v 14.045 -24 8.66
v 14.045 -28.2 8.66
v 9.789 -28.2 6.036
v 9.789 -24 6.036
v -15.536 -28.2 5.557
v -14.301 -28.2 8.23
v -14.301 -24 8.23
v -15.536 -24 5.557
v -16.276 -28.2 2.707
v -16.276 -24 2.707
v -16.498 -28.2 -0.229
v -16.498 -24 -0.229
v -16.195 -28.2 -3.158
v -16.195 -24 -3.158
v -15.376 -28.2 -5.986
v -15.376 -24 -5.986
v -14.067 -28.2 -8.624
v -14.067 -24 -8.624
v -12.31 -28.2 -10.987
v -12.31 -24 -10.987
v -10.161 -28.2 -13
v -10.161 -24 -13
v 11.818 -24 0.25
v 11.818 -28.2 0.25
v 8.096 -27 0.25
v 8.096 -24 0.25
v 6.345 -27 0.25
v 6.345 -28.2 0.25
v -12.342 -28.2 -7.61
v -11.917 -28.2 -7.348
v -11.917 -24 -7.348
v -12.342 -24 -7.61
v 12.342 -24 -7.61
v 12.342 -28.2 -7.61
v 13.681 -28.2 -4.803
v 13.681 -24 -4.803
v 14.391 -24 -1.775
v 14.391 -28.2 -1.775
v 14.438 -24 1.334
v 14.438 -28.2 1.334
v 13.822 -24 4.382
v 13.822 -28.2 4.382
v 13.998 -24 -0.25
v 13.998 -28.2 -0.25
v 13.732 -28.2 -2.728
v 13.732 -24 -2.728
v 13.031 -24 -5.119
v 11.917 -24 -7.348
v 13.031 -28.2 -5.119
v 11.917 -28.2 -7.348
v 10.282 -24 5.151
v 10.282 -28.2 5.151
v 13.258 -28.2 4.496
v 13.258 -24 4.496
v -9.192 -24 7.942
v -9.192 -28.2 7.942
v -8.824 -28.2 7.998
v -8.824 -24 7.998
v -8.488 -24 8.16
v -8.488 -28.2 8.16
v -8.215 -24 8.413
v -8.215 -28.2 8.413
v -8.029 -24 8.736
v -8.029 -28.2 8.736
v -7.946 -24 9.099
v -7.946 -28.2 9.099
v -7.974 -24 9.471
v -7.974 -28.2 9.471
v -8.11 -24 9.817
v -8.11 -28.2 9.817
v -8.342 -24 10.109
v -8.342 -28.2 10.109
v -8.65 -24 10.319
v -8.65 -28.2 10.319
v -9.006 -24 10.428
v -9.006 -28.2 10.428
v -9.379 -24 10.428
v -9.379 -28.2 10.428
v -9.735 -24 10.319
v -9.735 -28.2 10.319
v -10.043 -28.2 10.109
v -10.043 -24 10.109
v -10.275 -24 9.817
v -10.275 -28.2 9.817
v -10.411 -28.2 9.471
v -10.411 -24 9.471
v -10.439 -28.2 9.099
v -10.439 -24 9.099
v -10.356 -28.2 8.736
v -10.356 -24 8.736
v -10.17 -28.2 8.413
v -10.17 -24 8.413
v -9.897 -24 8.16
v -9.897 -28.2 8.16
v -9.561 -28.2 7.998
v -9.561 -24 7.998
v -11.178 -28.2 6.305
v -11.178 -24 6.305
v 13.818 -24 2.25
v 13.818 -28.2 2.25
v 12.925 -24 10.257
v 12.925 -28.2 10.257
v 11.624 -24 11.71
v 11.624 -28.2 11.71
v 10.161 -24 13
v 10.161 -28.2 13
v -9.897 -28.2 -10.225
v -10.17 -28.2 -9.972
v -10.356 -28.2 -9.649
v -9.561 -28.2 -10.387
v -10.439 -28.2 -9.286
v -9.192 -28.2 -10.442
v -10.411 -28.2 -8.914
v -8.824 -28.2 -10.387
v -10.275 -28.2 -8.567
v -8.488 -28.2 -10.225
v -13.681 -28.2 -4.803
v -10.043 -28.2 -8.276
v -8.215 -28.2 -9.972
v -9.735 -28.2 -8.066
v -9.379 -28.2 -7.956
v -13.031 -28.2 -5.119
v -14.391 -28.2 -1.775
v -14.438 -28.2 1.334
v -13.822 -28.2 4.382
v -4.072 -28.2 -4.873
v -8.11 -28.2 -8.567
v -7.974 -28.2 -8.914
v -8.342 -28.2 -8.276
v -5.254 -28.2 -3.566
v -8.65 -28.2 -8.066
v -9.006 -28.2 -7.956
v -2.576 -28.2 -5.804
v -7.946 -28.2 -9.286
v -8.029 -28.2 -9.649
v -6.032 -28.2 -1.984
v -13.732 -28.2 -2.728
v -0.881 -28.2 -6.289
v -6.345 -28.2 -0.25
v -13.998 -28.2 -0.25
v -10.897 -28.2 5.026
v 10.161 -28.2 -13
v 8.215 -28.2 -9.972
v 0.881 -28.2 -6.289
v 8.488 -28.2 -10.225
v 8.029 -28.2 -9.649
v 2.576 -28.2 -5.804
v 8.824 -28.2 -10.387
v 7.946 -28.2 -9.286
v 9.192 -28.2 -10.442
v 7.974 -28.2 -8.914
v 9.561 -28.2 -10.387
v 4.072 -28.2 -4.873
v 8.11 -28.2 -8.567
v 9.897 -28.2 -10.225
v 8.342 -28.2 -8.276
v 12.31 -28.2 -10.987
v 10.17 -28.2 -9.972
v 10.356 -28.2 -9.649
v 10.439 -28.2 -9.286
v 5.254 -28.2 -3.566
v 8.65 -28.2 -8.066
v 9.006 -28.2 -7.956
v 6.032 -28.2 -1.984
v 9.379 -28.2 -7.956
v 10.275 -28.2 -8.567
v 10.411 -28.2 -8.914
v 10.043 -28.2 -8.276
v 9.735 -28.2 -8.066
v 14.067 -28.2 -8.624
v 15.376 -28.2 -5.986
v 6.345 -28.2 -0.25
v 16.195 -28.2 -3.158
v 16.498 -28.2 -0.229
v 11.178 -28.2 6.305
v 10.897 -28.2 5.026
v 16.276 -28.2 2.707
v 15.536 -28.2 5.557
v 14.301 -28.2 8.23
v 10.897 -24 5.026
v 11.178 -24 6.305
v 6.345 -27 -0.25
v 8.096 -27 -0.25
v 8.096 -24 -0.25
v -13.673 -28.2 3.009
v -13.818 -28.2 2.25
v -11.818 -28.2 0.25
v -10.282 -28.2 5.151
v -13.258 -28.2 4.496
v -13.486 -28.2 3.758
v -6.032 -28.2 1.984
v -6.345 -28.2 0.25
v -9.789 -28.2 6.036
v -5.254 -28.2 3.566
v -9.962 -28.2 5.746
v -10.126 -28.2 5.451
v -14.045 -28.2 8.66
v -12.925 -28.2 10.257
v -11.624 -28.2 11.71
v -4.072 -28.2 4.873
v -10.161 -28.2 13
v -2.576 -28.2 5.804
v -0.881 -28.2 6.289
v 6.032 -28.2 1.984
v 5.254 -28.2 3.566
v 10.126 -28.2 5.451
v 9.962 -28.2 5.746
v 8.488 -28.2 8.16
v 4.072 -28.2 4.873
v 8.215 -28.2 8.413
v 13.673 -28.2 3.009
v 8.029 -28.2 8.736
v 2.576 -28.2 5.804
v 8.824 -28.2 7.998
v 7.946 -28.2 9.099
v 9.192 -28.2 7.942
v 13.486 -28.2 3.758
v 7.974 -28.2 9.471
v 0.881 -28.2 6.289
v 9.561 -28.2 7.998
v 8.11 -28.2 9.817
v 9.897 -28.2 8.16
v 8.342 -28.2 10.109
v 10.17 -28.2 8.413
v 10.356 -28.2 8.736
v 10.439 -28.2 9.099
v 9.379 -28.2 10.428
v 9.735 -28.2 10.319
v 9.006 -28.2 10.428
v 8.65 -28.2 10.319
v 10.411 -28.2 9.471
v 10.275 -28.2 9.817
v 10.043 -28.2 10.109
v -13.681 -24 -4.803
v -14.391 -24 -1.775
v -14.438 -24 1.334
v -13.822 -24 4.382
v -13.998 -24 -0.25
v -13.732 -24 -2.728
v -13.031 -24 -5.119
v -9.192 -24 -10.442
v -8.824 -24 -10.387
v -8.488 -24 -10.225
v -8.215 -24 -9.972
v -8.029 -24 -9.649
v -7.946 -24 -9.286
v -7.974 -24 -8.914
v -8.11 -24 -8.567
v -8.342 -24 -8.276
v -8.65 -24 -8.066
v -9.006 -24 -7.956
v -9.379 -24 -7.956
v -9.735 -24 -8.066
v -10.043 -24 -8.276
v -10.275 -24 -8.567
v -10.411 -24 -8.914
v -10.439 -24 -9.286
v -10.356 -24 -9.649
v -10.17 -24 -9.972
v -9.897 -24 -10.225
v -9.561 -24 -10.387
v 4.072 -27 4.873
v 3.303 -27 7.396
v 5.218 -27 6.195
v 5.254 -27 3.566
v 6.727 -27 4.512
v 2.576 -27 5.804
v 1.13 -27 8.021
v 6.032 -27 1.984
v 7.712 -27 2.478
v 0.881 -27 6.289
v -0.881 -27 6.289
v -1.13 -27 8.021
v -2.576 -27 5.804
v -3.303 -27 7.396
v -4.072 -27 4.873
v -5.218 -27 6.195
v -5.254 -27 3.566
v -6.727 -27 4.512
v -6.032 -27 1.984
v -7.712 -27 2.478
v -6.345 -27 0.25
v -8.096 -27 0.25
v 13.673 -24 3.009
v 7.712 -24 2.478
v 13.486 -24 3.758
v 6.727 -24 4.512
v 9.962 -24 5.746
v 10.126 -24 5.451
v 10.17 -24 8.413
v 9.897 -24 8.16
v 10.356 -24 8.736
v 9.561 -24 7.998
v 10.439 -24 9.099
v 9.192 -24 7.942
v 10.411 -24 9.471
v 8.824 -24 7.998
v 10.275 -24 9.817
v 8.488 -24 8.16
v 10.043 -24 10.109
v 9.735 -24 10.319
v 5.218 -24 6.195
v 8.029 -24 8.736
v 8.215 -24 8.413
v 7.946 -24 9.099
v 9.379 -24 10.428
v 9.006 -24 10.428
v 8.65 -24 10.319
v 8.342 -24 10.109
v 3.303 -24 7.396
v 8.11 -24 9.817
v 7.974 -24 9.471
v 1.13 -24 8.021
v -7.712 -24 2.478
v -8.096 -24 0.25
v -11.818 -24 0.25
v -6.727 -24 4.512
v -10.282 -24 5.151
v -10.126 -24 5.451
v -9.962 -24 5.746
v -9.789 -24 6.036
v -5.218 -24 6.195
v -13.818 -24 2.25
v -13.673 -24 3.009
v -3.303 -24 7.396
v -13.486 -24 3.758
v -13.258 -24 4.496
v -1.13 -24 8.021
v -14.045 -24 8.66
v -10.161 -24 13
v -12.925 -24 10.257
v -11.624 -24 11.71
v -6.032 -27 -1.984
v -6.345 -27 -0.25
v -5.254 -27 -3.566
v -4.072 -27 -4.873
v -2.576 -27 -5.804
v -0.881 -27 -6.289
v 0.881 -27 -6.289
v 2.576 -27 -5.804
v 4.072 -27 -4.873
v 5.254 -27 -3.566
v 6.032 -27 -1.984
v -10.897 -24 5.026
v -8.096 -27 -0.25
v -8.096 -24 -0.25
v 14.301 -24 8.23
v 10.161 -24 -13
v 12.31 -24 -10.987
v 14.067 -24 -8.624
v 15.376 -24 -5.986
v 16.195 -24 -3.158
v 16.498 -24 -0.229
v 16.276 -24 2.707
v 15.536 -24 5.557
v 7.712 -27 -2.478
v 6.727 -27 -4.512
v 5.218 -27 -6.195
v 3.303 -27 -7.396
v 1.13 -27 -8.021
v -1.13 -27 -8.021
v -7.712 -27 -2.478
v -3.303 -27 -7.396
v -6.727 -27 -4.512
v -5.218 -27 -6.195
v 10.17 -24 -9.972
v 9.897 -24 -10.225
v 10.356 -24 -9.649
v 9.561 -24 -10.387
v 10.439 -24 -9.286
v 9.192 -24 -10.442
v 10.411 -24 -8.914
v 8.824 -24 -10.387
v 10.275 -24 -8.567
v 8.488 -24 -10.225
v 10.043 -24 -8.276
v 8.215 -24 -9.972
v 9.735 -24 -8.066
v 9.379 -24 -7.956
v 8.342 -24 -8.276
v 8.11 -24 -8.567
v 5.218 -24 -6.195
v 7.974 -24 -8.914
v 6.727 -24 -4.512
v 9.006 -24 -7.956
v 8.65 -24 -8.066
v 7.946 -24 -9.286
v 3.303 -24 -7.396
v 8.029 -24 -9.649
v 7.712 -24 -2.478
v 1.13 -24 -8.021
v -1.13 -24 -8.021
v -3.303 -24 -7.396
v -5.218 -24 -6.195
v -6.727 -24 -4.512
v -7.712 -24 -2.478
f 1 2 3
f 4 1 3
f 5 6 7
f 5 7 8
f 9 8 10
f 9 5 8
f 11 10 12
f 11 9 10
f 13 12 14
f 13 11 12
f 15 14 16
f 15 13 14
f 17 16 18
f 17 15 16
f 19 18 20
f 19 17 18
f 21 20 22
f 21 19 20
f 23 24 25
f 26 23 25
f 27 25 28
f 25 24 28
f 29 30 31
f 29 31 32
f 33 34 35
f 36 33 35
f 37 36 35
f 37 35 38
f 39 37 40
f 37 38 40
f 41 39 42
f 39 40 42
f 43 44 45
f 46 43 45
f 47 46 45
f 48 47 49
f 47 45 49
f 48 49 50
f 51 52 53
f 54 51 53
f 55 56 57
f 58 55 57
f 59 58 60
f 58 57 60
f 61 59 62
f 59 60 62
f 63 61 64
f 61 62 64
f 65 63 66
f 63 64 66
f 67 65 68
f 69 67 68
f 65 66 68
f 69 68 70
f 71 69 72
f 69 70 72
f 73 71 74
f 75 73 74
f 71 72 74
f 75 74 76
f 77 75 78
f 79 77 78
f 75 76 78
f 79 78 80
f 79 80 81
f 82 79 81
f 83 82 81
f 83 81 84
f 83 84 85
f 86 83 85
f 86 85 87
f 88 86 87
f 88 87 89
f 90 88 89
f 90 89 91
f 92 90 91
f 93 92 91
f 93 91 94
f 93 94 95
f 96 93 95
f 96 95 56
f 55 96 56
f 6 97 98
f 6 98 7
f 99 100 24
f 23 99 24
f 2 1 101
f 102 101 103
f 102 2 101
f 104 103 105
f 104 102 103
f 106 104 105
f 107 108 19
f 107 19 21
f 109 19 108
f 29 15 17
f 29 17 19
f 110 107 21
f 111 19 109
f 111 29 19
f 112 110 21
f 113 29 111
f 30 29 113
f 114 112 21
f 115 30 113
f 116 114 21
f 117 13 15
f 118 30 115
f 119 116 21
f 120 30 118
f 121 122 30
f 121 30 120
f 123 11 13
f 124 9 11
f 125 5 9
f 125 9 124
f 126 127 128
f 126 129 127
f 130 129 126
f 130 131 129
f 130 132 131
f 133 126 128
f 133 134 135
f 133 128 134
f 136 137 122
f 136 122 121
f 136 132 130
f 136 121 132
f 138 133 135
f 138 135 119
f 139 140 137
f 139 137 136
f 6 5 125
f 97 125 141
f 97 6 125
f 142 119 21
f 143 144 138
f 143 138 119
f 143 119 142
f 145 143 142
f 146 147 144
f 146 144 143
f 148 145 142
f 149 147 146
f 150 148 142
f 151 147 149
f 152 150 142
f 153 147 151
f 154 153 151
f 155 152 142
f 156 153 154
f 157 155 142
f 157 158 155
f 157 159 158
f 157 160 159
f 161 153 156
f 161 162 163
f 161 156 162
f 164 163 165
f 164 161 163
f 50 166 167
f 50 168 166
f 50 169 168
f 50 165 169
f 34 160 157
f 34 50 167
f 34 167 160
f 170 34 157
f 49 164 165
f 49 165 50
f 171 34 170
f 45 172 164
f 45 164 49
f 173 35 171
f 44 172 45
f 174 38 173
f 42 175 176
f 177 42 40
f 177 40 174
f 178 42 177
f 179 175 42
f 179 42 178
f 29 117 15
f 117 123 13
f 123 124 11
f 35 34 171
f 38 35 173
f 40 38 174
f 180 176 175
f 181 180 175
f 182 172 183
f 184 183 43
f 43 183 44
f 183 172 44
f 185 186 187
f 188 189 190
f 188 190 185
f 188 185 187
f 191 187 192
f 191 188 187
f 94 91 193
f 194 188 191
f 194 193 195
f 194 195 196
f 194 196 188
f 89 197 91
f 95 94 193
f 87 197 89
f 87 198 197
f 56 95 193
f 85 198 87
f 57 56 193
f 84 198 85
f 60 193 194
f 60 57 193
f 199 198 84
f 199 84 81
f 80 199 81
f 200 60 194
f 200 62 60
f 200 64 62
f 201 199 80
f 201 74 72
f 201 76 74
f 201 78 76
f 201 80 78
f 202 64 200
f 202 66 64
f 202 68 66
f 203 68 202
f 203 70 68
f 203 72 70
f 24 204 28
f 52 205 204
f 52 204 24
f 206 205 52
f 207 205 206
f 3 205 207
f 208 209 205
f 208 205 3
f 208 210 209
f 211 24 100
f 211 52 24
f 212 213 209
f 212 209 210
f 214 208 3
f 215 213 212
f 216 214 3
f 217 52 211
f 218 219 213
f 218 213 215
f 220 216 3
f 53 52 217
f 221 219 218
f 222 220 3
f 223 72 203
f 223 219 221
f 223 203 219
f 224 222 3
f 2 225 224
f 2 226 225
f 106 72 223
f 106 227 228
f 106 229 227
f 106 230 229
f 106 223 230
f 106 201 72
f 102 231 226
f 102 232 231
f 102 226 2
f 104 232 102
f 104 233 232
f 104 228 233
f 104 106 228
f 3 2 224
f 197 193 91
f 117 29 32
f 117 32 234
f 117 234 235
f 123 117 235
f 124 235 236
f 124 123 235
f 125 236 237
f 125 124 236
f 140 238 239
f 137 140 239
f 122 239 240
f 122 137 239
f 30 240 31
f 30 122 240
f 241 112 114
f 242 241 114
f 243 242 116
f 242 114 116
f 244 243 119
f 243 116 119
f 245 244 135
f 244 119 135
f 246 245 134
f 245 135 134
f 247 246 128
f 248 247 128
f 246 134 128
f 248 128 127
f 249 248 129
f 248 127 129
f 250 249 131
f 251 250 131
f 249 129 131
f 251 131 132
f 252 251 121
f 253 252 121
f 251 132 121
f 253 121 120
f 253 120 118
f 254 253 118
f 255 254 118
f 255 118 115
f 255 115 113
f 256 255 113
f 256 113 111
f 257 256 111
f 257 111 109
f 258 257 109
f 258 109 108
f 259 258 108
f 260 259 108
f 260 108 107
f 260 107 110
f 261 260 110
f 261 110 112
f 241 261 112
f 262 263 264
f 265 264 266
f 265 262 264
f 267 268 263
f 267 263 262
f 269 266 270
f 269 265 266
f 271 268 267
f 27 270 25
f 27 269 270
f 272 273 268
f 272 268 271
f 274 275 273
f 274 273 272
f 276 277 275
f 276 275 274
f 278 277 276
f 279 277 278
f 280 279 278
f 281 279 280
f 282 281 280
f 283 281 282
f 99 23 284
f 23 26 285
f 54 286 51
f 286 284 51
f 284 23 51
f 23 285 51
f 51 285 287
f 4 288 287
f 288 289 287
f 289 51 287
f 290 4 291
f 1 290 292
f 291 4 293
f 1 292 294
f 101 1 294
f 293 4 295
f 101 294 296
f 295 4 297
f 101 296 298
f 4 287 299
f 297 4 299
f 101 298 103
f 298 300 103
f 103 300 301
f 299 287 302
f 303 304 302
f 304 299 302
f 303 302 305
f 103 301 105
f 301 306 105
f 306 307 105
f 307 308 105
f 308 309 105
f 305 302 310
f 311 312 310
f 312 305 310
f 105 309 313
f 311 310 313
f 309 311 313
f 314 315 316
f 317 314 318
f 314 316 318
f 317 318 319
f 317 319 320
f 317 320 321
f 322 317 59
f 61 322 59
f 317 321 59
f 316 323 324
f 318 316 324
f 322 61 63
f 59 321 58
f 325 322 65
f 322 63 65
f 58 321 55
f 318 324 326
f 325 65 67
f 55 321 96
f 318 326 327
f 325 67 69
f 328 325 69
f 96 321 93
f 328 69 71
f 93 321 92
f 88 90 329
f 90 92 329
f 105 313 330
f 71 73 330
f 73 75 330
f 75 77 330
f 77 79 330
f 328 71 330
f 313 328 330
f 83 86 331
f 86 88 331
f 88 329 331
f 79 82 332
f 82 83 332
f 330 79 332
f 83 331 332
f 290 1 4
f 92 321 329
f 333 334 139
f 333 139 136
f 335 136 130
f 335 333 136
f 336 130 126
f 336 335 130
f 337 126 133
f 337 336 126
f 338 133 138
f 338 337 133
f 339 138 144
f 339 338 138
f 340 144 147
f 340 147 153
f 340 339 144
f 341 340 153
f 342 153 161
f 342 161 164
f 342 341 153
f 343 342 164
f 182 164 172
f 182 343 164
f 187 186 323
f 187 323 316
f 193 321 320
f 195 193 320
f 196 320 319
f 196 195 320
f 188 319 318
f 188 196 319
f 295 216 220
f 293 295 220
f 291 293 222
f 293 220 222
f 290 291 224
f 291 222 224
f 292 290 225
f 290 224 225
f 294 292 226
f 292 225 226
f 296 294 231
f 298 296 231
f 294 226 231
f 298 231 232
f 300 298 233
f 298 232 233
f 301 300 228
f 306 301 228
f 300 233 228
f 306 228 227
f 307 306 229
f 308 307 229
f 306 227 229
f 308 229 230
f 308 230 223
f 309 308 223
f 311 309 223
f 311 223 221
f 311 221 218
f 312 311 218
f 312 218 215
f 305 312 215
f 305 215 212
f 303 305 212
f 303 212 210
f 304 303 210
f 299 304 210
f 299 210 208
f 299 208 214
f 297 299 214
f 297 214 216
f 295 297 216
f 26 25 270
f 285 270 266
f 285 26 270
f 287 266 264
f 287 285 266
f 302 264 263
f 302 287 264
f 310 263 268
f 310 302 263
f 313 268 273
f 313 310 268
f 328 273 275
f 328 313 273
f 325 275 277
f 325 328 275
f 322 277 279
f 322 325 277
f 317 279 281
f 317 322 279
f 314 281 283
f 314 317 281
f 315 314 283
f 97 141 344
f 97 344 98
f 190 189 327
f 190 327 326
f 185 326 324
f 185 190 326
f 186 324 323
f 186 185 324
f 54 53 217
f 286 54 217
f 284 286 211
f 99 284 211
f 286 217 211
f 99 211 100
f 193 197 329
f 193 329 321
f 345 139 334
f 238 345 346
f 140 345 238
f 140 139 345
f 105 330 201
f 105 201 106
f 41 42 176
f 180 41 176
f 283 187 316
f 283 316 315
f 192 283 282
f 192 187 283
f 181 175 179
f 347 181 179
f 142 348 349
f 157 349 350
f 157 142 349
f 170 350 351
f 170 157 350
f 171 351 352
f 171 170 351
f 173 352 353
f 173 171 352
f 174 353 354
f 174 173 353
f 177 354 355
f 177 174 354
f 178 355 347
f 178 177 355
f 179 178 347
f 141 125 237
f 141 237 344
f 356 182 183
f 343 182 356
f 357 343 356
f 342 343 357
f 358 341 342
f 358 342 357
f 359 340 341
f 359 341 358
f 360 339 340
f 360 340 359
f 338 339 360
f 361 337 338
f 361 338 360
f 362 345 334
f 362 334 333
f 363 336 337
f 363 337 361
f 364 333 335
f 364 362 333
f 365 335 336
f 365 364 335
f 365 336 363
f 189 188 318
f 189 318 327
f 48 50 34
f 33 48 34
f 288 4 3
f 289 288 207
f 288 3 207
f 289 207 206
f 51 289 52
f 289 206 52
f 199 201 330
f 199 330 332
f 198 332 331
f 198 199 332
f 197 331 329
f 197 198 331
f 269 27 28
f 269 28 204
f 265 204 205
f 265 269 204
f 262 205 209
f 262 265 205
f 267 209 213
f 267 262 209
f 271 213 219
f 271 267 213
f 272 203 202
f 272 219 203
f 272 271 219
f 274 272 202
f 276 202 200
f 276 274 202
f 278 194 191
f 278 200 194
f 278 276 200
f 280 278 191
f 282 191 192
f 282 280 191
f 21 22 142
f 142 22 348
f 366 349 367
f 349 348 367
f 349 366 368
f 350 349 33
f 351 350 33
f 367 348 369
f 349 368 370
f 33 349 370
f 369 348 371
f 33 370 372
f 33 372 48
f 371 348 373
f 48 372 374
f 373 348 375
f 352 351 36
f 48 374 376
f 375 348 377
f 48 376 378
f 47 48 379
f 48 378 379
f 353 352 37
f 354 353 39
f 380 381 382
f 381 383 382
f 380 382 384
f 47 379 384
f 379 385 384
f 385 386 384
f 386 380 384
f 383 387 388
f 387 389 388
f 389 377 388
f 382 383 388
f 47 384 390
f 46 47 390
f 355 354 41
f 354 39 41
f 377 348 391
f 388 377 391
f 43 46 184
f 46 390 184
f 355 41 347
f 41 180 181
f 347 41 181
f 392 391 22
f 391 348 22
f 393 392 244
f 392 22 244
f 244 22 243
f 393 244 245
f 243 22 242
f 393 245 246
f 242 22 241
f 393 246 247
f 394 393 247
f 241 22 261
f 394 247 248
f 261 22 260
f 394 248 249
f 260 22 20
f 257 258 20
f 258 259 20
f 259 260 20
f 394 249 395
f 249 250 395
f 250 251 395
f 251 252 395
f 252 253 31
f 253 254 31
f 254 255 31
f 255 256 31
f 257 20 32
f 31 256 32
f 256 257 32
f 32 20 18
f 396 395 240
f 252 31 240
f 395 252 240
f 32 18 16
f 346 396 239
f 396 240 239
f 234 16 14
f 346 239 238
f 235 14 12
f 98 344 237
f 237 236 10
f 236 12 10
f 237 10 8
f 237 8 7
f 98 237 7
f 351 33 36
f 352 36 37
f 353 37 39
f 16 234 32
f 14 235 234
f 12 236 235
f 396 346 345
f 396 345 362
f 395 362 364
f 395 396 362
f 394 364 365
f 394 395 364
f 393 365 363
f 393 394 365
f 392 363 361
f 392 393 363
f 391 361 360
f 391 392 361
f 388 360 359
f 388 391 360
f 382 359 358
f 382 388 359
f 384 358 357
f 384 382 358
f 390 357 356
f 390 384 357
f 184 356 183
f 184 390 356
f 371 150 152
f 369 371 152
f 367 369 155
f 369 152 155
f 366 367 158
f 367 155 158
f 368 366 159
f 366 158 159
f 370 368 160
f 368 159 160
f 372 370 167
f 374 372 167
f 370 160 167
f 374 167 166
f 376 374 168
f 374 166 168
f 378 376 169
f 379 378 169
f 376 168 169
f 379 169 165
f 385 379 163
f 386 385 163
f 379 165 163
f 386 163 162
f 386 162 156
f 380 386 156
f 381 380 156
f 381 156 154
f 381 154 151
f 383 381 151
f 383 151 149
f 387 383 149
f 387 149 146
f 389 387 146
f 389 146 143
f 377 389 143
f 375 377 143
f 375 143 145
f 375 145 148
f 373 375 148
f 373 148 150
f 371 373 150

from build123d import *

# Parameters (mm, degrees)
SKETCH4_R            = 1.2
CUT_EXTRUDE2_DEPTH   = 27.711420778
SKETCH4_3_R          = 2.25
SKETCH4_3_R_2        = 1.2
CUT_EXTRUDE3_DEPTH   = 9.4
CHAMFER1_SIZE        = 1
SKETCH2_W            = 41.708786628
SKETCH2_H            = 54.576605706
CUT_EXTRUDE1_DEPTH   = 0.05
SKETCH1_5_W          = 8.4
SKETCH1_5_H          = 3
SKETCH1_5_H_2        = 1.2
SKETCH10_R           = 1.25
CUT_EXTRUDE9_DEPTH   = 24.951200387
CUT_EXTRUDE6_START   = -5.4
CUT_EXTRUDE6_DEPTH   = 5.4
CUT_EXTRUDE7_DEPTH   = 1.2
SKETCH11_OUTSIDE_W   = 44.372
SKETCH11_OUTSIDE_H   = 44.372
SKETCH11_OUTSIDE_W_2 = 60
SKETCH11_OUTSIDE_H_2 = 26
CUT_EXTRUDE10_DEPTH  = 24.70949177


# Read off the part's stored shape, not the designer's step: Cut-Extrude6
with BuildPart() as part:
    # Sketch1 → Revolve1 (revolve)
    with BuildSketch(Plane.XY, mode=Mode.PRIVATE) as revolve1_sk:
        Polygon((-3, 0), (-8, 0), (-8, -3.7), (-6, -3.7), (-6, -9.7), (-8, -9.7), (-8, -13), (-16.5, -13), (-16.5, -23.9), (-6.1, -23.9), (-6.1, -21), (-8.1, -21), (-8.1, -14.3), (-3, -14.3), align=None)
    revolve(revolve1_sk.sketch.rotate(Axis((0, 21.737527327, 0), (0, -1, 0)), 270), axis=Axis((0, 21.737527327, 0), (0, -1, 0)))

    # Sketch4 → Cut-Extrude2 (cut, through all)
    with BuildSketch(Plane(origin=(0, -13, 0), x_dir=(1, 0, 0), z_dir=(0, 1, 0))):
        with Locations(Location((-9.192388155, 9.192388155, 0), (0, 0, 270))):
            Circle(SKETCH4_R)
        with Locations(Location((9.192388155, 9.192388155, 0), (0, 0, 270))):
            Circle(SKETCH4_R)
        with Locations(Location((9.192388155, -9.192388155, 0), (0, 0, 270))):
            Circle(SKETCH4_R)
        with Locations(Location((-9.192388155, -9.192388155, 0), (0, 0, 270))):
            Circle(SKETCH4_R)
    extrude(amount=-CUT_EXTRUDE2_DEPTH, mode=Mode.SUBTRACT)

    # Sketch4<3> → Cut-Extrude3 (cut)
    # profile 1 of 5: a face of its own
    with BuildSketch(Plane(origin=(0, -13, 0), x_dir=(1, 0, 0), z_dir=(0, 1, 0))):
        with Locations(Location((9.192388155, 9.192388155, 0), (0, 0, 270))):
            Circle(SKETCH4_3_R)
        with Locations(Location((9.192388155, 9.192388155, 0), (0, 0, 270))):
            Circle(SKETCH4_3_R_2, mode=Mode.SUBTRACT)
    # profile 2 of 5: a face of its own
    with BuildSketch(Plane(origin=(0, -13, 0), x_dir=(1, 0, 0), z_dir=(0, 1, 0))):
        with Locations(Location((9.192388155, -9.192388155, 0), (0, 0, 270))):
            Circle(SKETCH4_3_R)
        with Locations(Location((9.192388155, -9.192388155, 0), (0, 0, 270))):
            Circle(SKETCH4_3_R_2, mode=Mode.SUBTRACT)
    # profile 3 of 5: a face of its own
    with BuildSketch(Plane(origin=(0, -13, 0), x_dir=(1, 0, 0), z_dir=(0, 1, 0))):
        with Locations(Location((-9.192388155, -9.192388155, 0), (0, 0, 270))):
            Circle(SKETCH4_3_R)
        with Locations(Location((-9.192388155, -9.192388155, 0), (0, 0, 270))):
            Circle(SKETCH4_3_R_2, mode=Mode.SUBTRACT)
    # profile 4 of 5: a face of its own
    with BuildSketch(Plane(origin=(0, -13, 0), x_dir=(1, 0, 0), z_dir=(0, 1, 0))):
        with Locations(Location((-9.192388155, 9.192388155, 0), (0, 0, 270))):
            Circle(SKETCH4_3_R_2)
    # profile 5 of 5: a face of its own
    with BuildSketch(Plane(origin=(0, -13, 0), x_dir=(1, 0, 0), z_dir=(0, 1, 0))):
        with Locations(Location((-9.192388155, 9.192388155, 0), (0, 0, 270))):
            Circle(SKETCH4_3_R)
    extrude(amount=-CUT_EXTRUDE3_DEPTH, mode=Mode.SUBTRACT)

    # Chamfer1
    chamfer1_edges = [part.edges().sort_by_distance(p)[0] for p in [
        (0, 0, -3),
    ]]
    chamfer(chamfer1_edges, length=CHAMFER1_SIZE)

    # Sketch2 → Cut-Extrude1 (cut, symmetric)
    with BuildSketch(Plane.XY):
        Rectangle(SKETCH2_W, SKETCH2_H)
    extrude(amount=CUT_EXTRUDE1_DEPTH, both=True, mode=Mode.SUBTRACT)


with BuildPart() as cut_extrude1_piece_1:
    # of the separate pieces the step leaves, piece 1, a body of its own (cut_extrude1_pieces)
    add(part.part.solids().sort_by_distance((-2.999583304, -1, 0.05))[0])


with BuildPart() as cut_extrude1_piece_2:
    # of the separate pieces the step leaves, piece 2, a body of its own (cut_extrude1_pieces)
    add(part.part.solids().sort_by_distance((-2.999583304, -1, -0.05))[0])


with BuildPart() as body_3:
    # Sketch1<5> → Revolve2 (revolve)
    with BuildSketch(Plane.XY, mode=Mode.PRIVATE) as revolve2_sk:
        with Locations((-12.3, -25.5)):
            Rectangle(SKETCH1_5_W, SKETCH1_5_H)
        Polygon((-6.35, -27), (-8.1, -27), (-16.5, -27), (-16.5, -28.2), (-8.1, -28.2), (-6.35, -28.2), align=None)
        with Locations((-12.3, -28.8)):
            Rectangle(SKETCH1_5_W, SKETCH1_5_H_2)
    revolve(revolve2_sk.sketch.rotate(Axis((0, 21.737527327, 0), (0, -1, 0)), 270), axis=Axis((0, 21.737527327, 0), (0, -1, 0)))

    # Sketch10 → Cut-Extrude9 (cut, through all)
    with BuildSketch(Plane.XZ.offset(29.4)):
        with Locations(Location((-9.192388155, 9.192388155, 0), (0, 0, 270))):
            Circle(SKETCH10_R)
        with Locations(Location((9.192388155, 9.192388155, 0), (0, 0, 270))):
            Circle(SKETCH10_R)
        with Locations(Location((9.192388155, -9.192388155, 0), (0, 0, 270))):
            Circle(SKETCH10_R)
        with Locations(Location((-9.192388155, -9.192388155, 0), (0, 0, 270))):
            Circle(SKETCH10_R)
    extrude(amount=-CUT_EXTRUDE9_DEPTH, mode=Mode.SUBTRACT)

    # Cut-Extrude6 outline → Cut-Extrude6 (cut)
    with BuildSketch(Plane(origin=(0, -24, 0), x_dir=(1, 0, 0), z_dir=(0, 1, 0)).offset(CUT_EXTRUDE6_START)):
        with BuildLine():
            ThreePointArc((-6.345076832, -0.25), (-6.35, 0), (-6.345076832, 0.25))
            Line((-6.345076832, 0.25), (-13.997767679, 0.25))
            ThreePointArc((-13.997767679, 0.25), (-13.434499109, 3.938811204), (-11.916791658, 7.347793995))
            Line((-11.916791658, 7.347793995), (-12.34239136, 7.610215209))
            ThreePointArc((-12.34239136, 7.610215209), (-14.390898722, 1.775396852), (-13.821906079, -4.382340966))
            Line((-13.821906079, -4.382340966), (-10.896795834, -5.025916887))
            Line((-10.896795834, -5.025916887), (-11.178213769, -6.304986624))
            Line((-11.178213769, -6.304986624), (-14.300761421, -8.230323371))
            ThreePointArc((-14.300761421, -8.230323371), (-14.174403259, -8.446081473), (-14.044790168, -8.659900065))
            Line((-14.044790168, -8.659900065), (-9.788793147, -6.035687924))
            ThreePointArc((-9.788793147, -6.035687924), (-10.045093899, -5.598757771), (-10.281904658, -5.150964628))
            Line((-10.281904658, -5.150964628), (-13.258402706, -4.496082483))
            ThreePointArc((-13.258402706, -4.496082483), (-13.584708377, -3.38462676), (-13.818013605, -2.25))
            Line((-13.818013605, -2.25), (-11.818013605, -0.25))
            Line((-11.818013605, -0.25), (-6.345076832, -0.25))
        make_face()
    cut_extrude6 = extrude(amount=CUT_EXTRUDE6_DEPTH, mode=Mode.SUBTRACT)

    # Sketch8 → Cut-Extrude7 (cut)
    with BuildSketch(Plane.XZ.offset(29.4)):
        with BuildLine():
            Line((-11.818013605, 0.25), (-8.096141056, 0.25))
            ThreePointArc((-8.096141056, 0.25), (8.1, 0), (-8.096141056, -0.25))
            Line((-8.096141056, -0.25), (-13.997767679, -0.25))
            ThreePointArc((-13.997767679, -0.25), (-13.434499109, -3.938811203), (-11.916791658, -7.347793995))
            Line((-11.916791658, -7.347793995), (-12.34239136, -7.610215209))
            ThreePointArc((-12.34239136, -7.610215209), (-14.390898722, -1.775396852), (-13.821906079, 4.382340966))
            Line((-13.821906079, 4.382340966), (-10.896795834, 5.025916887))
            Line((-10.896795834, 5.025916887), (-11.178213769, 6.304986624))
            Line((-11.178213769, 6.304986624), (-14.300761421, 8.230323371))
            ThreePointArc((-14.300761421, 8.230323371), (14.174403259, -8.446081473), (-14.044790168, 8.659900065))
            Line((-14.044790168, 8.659900065), (-9.788793147, 6.035687924))
            ThreePointArc((-9.788793147, 6.035687924), (-10.045093899, 5.59875777), (-10.281904658, 5.150964628))
            Line((-10.281904658, 5.150964628), (-13.258402706, 4.496082483))
            ThreePointArc((-13.258402706, 4.496082483), (-13.584708377, 3.38462676), (-13.818013605, 2.25))
            Line((-13.818013605, 2.25), (-11.818013605, 0.25))
        make_face()
    extrude(amount=-CUT_EXTRUDE7_DEPTH, mode=Mode.SUBTRACT)

    # Mirror2: Cut-Extrude6 across plane
    add(cut_extrude6.mirror(Plane(origin=(0, 0, 0), x_dir=(0, 0, 1), z_dir=(1, 0, 0))), mode=Mode.SUBTRACT)

    # Sketch11 outside → Cut-Extrude10 (cut, through all)
    with BuildSketch(Plane(origin=(0, -24, 0), x_dir=(1, 0, 0), z_dir=(0, 1, 0))):
        Rectangle(SKETCH11_OUTSIDE_W, SKETCH11_OUTSIDE_H)
        Rectangle(SKETCH11_OUTSIDE_W_2, SKETCH11_OUTSIDE_H_2, mode=Mode.SUBTRACT)
    extrude(amount=-CUT_EXTRUDE10_DEPTH, mode=Mode.SUBTRACT)


solid = body_3.part
